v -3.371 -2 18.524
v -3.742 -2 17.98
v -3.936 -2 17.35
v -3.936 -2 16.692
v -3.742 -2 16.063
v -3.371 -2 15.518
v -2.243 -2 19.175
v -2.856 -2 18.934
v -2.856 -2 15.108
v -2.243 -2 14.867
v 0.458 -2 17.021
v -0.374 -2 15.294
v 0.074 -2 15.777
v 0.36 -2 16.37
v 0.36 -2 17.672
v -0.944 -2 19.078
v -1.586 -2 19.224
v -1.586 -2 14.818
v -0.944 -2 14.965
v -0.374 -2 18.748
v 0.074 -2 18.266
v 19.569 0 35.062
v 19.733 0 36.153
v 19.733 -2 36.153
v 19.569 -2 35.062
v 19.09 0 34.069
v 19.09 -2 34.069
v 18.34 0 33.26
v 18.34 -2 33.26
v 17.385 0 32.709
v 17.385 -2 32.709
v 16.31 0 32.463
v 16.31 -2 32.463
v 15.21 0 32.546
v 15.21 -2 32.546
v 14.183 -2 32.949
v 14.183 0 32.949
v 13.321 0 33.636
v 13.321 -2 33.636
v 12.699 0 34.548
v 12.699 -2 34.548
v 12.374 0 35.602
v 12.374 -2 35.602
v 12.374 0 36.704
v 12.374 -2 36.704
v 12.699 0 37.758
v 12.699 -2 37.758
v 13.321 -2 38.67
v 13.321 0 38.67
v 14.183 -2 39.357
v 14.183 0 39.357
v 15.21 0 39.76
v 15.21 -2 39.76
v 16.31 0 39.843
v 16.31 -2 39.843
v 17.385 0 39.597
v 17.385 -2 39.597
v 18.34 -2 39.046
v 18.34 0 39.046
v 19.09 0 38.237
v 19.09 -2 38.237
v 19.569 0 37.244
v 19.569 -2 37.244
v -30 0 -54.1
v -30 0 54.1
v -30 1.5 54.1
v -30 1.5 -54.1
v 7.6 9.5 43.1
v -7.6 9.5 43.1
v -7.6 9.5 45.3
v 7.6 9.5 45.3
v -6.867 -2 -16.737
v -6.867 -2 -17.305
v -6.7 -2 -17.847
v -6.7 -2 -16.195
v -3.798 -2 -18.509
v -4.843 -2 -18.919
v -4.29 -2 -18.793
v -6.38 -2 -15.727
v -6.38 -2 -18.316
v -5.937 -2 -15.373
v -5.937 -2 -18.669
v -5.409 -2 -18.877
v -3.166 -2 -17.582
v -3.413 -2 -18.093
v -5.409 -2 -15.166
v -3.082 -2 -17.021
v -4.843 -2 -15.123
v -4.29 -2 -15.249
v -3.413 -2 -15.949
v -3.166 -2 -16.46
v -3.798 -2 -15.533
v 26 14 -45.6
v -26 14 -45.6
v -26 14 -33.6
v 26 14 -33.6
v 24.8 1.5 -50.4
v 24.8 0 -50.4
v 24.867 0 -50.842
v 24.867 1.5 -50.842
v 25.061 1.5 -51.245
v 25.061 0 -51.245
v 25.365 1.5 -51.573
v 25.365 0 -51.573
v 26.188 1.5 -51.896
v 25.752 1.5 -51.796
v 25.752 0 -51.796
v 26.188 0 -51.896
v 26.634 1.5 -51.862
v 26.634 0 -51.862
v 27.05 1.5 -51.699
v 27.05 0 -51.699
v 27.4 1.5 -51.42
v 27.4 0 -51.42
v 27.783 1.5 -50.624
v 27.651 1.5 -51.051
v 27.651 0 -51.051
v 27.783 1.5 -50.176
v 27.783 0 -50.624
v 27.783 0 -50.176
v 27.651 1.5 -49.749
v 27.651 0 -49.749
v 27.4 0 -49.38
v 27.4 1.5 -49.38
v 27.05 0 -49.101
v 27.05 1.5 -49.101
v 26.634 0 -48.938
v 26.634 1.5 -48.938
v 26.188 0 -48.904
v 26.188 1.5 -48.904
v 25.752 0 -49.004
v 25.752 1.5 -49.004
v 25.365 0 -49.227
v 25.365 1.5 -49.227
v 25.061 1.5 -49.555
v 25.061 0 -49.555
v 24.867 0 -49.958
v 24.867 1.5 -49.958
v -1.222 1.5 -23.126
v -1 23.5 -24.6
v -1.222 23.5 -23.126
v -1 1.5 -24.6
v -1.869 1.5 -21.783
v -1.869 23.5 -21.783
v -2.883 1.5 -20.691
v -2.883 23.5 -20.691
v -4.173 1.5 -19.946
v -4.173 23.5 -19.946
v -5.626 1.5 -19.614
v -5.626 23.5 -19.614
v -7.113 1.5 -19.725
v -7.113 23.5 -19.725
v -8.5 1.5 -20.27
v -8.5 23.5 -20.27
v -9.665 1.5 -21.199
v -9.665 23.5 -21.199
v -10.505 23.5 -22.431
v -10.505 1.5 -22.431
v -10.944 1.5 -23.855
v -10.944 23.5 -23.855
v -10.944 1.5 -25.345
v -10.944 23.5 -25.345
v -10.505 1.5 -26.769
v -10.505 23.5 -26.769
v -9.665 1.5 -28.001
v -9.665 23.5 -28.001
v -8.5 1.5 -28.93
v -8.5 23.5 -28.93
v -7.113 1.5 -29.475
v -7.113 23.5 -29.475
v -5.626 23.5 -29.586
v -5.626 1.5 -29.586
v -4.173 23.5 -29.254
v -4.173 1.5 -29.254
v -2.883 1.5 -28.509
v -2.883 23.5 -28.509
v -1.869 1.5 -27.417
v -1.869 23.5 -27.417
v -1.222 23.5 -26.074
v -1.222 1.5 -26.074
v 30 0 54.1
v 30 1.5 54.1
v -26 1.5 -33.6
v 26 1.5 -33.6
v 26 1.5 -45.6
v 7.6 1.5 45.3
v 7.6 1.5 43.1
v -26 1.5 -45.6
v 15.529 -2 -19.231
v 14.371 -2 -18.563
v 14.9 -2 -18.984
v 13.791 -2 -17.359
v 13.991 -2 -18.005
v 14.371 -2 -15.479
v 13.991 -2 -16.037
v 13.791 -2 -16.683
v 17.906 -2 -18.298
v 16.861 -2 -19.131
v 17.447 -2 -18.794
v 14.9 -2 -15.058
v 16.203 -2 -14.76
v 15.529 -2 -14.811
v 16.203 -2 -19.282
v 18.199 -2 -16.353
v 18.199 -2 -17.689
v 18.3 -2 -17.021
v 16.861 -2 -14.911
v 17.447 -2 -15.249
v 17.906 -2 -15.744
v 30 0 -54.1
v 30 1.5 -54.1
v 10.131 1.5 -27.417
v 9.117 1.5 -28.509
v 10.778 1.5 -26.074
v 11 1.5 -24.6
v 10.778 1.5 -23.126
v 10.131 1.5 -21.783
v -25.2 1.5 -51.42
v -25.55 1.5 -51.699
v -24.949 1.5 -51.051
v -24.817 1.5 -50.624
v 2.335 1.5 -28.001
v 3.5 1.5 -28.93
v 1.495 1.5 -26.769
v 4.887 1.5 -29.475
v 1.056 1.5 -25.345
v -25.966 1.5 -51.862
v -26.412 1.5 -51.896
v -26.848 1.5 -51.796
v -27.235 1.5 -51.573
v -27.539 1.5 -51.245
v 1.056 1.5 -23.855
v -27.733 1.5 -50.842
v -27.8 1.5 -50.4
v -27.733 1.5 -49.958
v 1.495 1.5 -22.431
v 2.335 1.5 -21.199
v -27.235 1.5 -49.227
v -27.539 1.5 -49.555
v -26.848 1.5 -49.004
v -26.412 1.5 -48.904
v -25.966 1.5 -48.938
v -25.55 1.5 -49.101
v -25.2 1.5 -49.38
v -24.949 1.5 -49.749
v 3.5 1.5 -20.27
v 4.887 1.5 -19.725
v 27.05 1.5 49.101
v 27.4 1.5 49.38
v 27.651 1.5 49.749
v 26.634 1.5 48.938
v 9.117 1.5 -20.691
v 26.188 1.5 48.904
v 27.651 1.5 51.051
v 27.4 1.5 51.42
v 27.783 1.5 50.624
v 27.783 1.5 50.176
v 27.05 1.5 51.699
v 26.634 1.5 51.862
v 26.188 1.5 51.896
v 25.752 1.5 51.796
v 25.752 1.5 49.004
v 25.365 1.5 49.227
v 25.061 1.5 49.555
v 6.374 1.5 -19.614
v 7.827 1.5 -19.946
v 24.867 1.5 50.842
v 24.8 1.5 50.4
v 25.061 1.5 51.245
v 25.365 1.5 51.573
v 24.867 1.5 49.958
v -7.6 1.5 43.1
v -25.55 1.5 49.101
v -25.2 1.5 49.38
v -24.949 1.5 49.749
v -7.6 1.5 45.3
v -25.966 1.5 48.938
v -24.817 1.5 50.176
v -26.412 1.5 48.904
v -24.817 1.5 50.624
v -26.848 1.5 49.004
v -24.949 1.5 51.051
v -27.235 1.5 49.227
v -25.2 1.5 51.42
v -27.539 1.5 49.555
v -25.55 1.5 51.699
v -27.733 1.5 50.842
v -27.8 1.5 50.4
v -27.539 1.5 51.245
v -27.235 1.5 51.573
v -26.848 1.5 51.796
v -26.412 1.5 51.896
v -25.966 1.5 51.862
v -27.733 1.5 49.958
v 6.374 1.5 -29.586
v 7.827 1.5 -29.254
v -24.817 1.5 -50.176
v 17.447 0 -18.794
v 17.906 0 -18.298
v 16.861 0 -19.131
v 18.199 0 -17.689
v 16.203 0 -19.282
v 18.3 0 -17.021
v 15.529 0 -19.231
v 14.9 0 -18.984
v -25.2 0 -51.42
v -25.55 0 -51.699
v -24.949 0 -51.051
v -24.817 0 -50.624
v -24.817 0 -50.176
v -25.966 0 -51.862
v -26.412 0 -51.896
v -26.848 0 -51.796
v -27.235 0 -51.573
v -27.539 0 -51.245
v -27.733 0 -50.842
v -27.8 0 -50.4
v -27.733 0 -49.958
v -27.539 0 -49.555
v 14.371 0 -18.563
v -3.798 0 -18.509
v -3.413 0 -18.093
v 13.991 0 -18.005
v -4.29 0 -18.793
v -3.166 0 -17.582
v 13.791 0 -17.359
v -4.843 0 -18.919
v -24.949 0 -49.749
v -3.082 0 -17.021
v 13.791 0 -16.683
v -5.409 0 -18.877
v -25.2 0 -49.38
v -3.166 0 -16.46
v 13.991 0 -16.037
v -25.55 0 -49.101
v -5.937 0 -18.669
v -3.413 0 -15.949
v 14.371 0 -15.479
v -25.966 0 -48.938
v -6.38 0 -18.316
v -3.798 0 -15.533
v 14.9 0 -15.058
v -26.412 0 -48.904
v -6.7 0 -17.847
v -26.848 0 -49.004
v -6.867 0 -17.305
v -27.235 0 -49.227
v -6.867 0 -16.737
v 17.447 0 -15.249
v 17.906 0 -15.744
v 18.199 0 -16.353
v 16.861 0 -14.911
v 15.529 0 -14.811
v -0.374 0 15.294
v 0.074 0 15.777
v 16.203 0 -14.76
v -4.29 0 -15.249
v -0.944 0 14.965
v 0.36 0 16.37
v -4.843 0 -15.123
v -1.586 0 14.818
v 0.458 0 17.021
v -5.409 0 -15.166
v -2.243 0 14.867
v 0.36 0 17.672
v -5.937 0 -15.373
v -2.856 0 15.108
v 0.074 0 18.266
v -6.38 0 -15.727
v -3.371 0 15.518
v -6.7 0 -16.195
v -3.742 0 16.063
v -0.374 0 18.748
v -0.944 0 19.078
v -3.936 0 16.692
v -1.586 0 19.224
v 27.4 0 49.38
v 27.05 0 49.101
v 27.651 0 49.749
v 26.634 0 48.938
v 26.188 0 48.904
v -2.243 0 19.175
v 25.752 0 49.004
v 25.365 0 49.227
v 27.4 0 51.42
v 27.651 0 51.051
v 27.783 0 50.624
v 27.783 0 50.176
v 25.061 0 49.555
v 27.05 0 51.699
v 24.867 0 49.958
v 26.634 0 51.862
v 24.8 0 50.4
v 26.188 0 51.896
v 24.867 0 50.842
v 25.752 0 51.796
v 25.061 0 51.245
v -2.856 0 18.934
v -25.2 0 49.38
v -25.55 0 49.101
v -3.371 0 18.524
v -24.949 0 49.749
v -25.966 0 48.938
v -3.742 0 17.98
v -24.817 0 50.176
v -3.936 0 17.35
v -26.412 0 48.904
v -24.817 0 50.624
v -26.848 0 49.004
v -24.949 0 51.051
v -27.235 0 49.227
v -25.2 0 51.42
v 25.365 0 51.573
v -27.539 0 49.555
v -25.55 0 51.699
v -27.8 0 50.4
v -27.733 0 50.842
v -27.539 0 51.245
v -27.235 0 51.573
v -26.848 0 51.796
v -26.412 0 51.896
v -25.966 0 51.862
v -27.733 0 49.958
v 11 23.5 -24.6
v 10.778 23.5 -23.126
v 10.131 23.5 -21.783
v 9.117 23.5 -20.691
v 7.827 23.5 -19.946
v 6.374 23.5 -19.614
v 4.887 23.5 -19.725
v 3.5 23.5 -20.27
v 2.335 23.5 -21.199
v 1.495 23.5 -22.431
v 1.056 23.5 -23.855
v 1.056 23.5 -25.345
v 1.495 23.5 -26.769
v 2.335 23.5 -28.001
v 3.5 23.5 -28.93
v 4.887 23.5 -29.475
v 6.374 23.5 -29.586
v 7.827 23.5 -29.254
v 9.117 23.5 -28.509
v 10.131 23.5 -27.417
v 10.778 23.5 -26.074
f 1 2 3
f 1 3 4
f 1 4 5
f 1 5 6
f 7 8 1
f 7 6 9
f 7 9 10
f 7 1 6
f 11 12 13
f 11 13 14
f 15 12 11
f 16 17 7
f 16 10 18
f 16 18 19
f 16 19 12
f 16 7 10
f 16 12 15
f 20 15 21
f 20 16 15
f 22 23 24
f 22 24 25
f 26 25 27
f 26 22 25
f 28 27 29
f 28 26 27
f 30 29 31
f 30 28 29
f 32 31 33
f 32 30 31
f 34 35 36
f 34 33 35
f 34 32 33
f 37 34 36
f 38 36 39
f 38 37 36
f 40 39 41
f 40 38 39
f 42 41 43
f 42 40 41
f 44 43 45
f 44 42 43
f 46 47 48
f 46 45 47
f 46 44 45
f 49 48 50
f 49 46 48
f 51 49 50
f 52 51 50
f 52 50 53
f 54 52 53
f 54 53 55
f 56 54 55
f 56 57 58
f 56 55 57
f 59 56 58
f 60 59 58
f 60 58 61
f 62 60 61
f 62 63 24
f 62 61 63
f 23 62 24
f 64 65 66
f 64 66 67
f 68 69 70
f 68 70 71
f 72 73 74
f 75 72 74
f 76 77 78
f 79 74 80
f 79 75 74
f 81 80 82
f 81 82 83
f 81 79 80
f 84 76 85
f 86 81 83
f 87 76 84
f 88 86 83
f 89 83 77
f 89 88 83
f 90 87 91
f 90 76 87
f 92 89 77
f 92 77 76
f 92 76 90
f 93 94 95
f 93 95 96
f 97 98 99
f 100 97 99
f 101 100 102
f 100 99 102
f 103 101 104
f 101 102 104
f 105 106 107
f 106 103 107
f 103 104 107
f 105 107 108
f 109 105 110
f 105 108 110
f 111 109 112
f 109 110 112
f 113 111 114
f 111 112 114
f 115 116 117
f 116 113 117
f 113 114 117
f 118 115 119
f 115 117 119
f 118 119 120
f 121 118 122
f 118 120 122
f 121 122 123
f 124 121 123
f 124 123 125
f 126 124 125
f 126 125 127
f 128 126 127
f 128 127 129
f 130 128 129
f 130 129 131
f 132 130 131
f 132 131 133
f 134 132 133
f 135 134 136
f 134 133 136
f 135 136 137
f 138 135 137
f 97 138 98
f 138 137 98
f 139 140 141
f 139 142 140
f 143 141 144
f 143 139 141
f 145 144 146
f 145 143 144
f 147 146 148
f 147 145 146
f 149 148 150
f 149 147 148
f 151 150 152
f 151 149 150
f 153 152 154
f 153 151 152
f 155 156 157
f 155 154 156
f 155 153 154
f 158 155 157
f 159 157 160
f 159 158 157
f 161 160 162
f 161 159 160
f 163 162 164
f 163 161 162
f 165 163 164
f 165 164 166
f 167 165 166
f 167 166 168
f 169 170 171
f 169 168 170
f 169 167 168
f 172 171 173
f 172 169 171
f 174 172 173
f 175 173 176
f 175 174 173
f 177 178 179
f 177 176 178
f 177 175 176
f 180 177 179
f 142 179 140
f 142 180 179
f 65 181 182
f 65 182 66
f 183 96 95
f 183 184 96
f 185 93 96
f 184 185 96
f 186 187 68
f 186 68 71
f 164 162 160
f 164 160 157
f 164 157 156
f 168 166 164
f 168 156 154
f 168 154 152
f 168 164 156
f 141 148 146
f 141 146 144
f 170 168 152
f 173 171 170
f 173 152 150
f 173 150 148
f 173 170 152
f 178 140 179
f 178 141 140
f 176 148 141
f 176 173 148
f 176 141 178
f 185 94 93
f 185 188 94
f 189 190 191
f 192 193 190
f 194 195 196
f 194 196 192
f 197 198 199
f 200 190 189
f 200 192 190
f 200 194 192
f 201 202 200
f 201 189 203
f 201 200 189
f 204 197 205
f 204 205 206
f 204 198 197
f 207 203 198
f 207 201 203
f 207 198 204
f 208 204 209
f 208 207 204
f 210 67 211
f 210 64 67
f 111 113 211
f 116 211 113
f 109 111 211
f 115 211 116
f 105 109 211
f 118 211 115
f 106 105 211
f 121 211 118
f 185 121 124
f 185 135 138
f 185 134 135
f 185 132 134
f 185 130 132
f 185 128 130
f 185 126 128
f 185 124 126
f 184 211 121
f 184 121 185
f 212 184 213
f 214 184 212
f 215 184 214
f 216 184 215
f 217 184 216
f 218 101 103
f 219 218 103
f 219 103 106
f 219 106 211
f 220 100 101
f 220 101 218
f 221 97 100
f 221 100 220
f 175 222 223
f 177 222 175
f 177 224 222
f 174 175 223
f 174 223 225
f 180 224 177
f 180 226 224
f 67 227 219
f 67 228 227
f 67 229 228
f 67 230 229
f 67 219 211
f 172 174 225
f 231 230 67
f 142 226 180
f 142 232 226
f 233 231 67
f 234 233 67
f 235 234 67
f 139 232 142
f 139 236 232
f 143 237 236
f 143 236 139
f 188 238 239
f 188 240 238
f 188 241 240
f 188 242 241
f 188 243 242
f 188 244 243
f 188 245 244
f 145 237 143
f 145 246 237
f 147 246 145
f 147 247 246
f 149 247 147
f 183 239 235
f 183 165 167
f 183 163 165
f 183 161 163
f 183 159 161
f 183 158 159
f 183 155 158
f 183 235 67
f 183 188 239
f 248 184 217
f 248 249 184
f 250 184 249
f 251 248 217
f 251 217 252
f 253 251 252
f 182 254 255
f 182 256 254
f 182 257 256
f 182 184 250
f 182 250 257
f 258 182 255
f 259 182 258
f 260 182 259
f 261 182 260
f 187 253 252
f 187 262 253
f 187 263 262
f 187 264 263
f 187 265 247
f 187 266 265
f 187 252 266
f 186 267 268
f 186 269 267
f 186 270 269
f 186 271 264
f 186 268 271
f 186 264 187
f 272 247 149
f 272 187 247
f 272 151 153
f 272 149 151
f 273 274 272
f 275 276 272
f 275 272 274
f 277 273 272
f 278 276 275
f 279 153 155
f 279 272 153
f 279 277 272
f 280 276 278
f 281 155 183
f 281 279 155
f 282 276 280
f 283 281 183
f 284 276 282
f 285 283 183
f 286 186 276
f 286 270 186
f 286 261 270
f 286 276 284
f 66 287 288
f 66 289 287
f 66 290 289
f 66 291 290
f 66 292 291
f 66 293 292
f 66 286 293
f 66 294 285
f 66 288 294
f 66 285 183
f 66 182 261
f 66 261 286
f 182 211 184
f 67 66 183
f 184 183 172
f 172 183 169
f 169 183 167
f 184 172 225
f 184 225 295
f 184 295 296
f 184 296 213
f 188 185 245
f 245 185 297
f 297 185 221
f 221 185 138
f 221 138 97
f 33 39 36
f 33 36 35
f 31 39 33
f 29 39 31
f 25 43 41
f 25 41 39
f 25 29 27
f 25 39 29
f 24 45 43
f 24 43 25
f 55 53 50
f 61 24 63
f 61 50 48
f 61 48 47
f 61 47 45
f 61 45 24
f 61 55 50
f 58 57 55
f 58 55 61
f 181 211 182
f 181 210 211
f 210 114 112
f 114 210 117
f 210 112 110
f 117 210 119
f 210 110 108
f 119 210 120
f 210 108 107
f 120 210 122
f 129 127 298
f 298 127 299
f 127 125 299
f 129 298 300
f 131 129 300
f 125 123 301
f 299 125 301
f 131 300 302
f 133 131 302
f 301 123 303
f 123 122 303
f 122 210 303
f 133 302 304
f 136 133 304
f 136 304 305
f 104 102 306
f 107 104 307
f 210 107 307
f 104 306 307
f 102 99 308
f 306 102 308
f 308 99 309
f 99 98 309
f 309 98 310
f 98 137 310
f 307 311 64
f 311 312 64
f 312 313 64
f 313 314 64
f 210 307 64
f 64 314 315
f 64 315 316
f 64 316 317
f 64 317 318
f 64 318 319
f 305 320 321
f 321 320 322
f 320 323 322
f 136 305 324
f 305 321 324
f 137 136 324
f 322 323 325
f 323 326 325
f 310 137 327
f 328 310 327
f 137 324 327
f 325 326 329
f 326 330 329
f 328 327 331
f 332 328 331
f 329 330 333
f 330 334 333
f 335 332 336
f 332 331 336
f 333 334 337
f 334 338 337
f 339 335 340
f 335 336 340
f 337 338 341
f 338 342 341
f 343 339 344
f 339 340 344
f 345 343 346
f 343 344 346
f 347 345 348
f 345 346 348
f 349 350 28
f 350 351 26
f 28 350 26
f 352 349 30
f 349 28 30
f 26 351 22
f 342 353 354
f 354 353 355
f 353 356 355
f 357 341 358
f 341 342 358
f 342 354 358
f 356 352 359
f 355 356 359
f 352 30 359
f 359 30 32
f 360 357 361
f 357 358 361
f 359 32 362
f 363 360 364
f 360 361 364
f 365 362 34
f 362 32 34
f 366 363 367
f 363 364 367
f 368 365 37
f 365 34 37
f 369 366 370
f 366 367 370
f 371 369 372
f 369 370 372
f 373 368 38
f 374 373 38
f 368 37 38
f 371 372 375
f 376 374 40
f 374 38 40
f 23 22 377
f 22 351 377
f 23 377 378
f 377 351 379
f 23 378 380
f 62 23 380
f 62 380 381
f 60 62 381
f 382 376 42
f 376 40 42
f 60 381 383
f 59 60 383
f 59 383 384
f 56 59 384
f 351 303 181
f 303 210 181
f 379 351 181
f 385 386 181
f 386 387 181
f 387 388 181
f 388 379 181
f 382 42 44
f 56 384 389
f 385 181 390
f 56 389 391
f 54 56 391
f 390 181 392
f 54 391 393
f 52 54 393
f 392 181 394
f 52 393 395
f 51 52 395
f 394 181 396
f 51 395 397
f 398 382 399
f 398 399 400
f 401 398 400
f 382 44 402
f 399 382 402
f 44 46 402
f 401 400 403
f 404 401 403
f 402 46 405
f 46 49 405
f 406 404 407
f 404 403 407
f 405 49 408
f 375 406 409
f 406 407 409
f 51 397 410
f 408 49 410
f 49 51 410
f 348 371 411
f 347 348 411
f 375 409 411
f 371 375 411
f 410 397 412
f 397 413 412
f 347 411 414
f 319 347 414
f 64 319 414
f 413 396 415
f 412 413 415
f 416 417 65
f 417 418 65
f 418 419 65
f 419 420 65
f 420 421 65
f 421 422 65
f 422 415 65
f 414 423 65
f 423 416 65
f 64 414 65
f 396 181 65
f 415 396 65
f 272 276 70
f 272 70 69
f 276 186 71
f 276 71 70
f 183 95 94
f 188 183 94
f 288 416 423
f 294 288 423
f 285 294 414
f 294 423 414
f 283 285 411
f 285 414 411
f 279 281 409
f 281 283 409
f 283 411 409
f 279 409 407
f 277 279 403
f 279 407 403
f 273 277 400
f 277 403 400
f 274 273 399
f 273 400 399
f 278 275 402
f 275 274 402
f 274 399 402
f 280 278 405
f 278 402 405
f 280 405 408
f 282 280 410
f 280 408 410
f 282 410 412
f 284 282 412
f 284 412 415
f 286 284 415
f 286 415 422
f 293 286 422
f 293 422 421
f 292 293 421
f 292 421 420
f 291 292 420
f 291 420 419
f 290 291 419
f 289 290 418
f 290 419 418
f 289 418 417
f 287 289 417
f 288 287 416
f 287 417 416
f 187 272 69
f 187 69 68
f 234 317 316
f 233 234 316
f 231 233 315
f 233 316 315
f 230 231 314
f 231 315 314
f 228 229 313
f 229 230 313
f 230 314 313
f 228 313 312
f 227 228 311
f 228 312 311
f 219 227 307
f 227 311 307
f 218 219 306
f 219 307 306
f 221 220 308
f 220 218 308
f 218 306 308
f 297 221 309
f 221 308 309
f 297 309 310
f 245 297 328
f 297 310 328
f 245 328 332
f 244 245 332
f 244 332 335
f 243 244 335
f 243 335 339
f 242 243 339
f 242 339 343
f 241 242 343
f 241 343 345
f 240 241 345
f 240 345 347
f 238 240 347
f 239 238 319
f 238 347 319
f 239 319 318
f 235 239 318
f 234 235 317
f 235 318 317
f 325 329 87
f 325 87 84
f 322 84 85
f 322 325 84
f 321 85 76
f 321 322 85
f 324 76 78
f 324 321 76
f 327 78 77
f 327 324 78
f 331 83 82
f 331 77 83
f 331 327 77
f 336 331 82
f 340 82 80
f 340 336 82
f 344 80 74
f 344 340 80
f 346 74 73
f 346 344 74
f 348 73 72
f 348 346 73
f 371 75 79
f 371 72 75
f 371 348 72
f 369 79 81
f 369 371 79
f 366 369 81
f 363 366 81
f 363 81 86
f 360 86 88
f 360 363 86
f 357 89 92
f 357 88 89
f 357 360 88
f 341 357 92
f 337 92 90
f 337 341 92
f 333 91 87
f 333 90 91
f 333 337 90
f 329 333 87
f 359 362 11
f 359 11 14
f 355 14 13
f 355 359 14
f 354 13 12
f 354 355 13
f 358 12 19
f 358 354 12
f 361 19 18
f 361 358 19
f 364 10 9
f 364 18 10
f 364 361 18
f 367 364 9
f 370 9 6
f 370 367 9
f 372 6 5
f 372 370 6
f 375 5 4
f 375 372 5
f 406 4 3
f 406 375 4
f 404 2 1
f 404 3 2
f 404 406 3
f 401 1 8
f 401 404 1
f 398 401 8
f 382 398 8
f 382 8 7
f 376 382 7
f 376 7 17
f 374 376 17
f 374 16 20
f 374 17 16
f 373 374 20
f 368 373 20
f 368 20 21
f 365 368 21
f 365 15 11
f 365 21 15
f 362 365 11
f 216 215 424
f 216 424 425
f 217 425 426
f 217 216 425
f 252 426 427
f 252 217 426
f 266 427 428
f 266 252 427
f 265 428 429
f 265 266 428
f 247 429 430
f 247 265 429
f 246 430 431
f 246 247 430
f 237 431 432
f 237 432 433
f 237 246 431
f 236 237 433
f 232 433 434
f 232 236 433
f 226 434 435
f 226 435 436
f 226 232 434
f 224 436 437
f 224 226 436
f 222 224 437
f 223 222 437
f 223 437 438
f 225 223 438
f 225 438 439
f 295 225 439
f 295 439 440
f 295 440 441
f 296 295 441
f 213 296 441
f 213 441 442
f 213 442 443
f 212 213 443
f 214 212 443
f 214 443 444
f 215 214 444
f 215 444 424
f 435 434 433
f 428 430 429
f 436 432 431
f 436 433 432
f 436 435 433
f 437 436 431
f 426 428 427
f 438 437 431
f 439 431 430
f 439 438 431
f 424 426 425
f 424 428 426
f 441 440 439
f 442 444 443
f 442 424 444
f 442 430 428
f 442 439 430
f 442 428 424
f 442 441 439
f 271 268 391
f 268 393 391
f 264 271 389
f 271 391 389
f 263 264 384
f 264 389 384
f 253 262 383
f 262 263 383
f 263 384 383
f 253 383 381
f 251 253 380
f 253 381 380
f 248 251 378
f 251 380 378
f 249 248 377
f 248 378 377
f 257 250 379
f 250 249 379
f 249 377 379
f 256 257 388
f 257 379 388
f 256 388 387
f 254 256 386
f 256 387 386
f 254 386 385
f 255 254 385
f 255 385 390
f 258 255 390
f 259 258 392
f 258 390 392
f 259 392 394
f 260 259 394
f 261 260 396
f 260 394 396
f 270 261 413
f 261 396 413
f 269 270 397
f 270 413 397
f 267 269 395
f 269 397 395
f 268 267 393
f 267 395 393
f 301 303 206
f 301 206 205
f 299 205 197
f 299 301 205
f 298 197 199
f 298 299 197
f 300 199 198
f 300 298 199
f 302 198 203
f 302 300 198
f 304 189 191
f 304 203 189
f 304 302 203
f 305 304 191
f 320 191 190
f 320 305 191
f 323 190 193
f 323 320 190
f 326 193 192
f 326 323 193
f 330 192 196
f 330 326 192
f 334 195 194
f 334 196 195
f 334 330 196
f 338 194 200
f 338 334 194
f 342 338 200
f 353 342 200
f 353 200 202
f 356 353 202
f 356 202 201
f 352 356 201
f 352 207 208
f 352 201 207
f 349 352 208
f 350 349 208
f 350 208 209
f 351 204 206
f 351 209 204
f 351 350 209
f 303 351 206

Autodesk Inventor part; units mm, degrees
ref_plane "YZ Plane" through (0, 0, 0) normal (1, 0, 0) x (0, 1, 0)
ref_plane "XZ Plane" through (0, 0, 0) normal (0, 1, 0) x (-1, 0, 0)
ref_plane "XY Plane" through (0, 0, 0) normal (0, 0, 1) x (1, 0, 0)
sketch "Sketch1" plane through (0, 0, 0) normal (0, 1, 0) x (-1, 0, 0)
  line L0 (-30, 54.1) -> (30, 54.1)
  line L1 (30, 54.1) -> (30, -54.1)
  line L2 (30, -54.1) -> (-30, -54.1)
  line L3 (-30, -54.1) -> (-30, 54.1)
  line L4 (-30, 54.1) -> (30, -54.1) construction
  line L5 (30, 54.1) -> (-30, -54.1) construction
  circle A0 centre (26.3, 50.4) radius 1.5
  line L6 (0, 0) -> (11.9593, 0)
  line L7 (0, 0) -> (0, 9.8578)
  circle A1 centre (26.3, -50.4) radius 1.5
  circle A2 centre (-26.3, 50.4) radius 1.5
  circle A3 centre (-26.3, -50.4) radius 1.5
  dimension "d0" = 60
  dimension "d1" = 108.2
  dimension "d2" = 3.7
  dimension "d3" = 3.7
  dimension "d4" = 3
extrude "Extrusion1" add sketch "Sketch1" along normal blind 1.5
sketch "Sketch2" plane through (0, 1.5, 0) normal (0, 1, 0) x (1, 0, 0)
  line L0 (30, 54.1) -> (-30, 54.1) projected
  line L1 (-30, 54.1) -> (-30, -54.1) projected
  line L2 (-30, -54.1) -> (30, -54.1) projected
  line L3 (30, -54.1) -> (30, 54.1) projected
  circle A0 centre (26.3, 50.4) radius 1.5 projected
  circle A1 centre (26.3, -50.4) radius 1.5 projected
  circle A2 centre (-26.3, 50.4) radius 1.5 projected
  circle A3 centre (-26.3, -50.4) radius 1.5 projected
  line L4 (7.6, -45.3) -> (-7.6, -45.3)
  line L5 (-7.6, -45.3) -> (-7.6, -43.1)
  line L6 (-7.6, -43.1) -> (7.6, -43.1)
  line L7 (7.6, -43.1) -> (7.6, -45.3)
  line L8 (7.6, -45.3) -> (-7.6, -43.1) construction
  line L9 (-7.6, -45.3) -> (7.6, -43.1) construction
  point P0 (0, 0)
  point P1 (0, -44.2)
  point P2 (0, -54.1)
  dimension "d7" = 2.2
  dimension "d8" = 15.2
  dimension "d9" = 11
extrude "Extrusion2" add sketch "Sketch2" along normal blind 8 contours L4 L5 L6 L7
sketch "Sketch3" plane through (0, 0, 0) normal (0, -1, 0) x (1, 0, 0)
  circle A0 centre (16.0331, -17.0211) radius 2.267
  circle A1 centre (-4.9851, -17.0211) radius 1.9033
  circle A2 centre (-1.7515, 17.0211) radius 2.2093
  circle A3 centre (16.0331, 36.153) radius 3.7001
  point P0 (0, 0)
extrude "Extrusion3" add sketch "Sketch3" along normal blind 2
sketch "Sketch4" plane through (0, 1.5, 0) normal (0, 1, 0) x (1, 0, 0)
  circle A0 centre (-6, 24.6) radius 5
  circle A1 centre (6, 24.6) radius 5
  line L0 (30, 54.1) -> (-30, 54.1) projected
  line L1 (-6, 24.6) -> (6, 24.6)
  point P0 (0, 0)
  point P1 (0, 24.6)
  point P2 (0, 54.1)
  dimension "d14" = 10
  dimension "d15" = 29.5
  dimension "d16" = 12
extrude "Extrusion4" add sketch "Sketch4" along normal blind 22
sketch "Sketch5" plane through (0, 1.5, 0) normal (0, 1, 0) x (1, 0, 0)
  circle A0 centre (6, 24.6) radius 5 projected
  circle A1 centre (-6, 24.6) radius 5 projected
  line L0 (7.6, -43.1) -> (7.6, -45.3) projected
  line L1 (7.6, -45.3) -> (-7.6, -45.3) projected
  line L2 (-7.6, -45.3) -> (-7.6, -43.1) projected
  line L3 (-7.6, -43.1) -> (7.6, -43.1) projected
  line L4 (30, 54.1) -> (-30, 54.1) projected
  line L5 (-30, 54.1) -> (-30, -54.1) projected
  line L6 (-30, -54.1) -> (30, -54.1) projected
  line L7 (30, -54.1) -> (30, 54.1) projected
  circle A2 centre (26.3, 50.4) radius 1.5 projected
  circle A3 centre (26.3, -50.4) radius 1.5 projected
  circle A4 centre (-26.3, 50.4) radius 1.5 projected
  circle A5 centre (-26.3, -50.4) radius 1.5 projected
  line L8 (26, 33.6) -> (-26, 33.6)
  line L9 (-26, 33.6) -> (-26, 45.6)
  line L10 (-26, 45.6) -> (26, 45.6)
  line L11 (26, 45.6) -> (26, 33.6)
  line L12 (26, 33.6) -> (-26, 45.6) construction
  line L13 (-26, 33.6) -> (26, 45.6) construction
  point P0 (0, 0)
  point P1 (0, 39.6)
  dimension "d19" = 52
  dimension "d20" = 12
  dimension "d21" = 8.5
extrude "Extrusion5" add sketch "Sketch5" along normal blind 12.5 contours L8 L9 L10 L11
properties part number "DRIVER" material "Steel, Mild, Welded"
